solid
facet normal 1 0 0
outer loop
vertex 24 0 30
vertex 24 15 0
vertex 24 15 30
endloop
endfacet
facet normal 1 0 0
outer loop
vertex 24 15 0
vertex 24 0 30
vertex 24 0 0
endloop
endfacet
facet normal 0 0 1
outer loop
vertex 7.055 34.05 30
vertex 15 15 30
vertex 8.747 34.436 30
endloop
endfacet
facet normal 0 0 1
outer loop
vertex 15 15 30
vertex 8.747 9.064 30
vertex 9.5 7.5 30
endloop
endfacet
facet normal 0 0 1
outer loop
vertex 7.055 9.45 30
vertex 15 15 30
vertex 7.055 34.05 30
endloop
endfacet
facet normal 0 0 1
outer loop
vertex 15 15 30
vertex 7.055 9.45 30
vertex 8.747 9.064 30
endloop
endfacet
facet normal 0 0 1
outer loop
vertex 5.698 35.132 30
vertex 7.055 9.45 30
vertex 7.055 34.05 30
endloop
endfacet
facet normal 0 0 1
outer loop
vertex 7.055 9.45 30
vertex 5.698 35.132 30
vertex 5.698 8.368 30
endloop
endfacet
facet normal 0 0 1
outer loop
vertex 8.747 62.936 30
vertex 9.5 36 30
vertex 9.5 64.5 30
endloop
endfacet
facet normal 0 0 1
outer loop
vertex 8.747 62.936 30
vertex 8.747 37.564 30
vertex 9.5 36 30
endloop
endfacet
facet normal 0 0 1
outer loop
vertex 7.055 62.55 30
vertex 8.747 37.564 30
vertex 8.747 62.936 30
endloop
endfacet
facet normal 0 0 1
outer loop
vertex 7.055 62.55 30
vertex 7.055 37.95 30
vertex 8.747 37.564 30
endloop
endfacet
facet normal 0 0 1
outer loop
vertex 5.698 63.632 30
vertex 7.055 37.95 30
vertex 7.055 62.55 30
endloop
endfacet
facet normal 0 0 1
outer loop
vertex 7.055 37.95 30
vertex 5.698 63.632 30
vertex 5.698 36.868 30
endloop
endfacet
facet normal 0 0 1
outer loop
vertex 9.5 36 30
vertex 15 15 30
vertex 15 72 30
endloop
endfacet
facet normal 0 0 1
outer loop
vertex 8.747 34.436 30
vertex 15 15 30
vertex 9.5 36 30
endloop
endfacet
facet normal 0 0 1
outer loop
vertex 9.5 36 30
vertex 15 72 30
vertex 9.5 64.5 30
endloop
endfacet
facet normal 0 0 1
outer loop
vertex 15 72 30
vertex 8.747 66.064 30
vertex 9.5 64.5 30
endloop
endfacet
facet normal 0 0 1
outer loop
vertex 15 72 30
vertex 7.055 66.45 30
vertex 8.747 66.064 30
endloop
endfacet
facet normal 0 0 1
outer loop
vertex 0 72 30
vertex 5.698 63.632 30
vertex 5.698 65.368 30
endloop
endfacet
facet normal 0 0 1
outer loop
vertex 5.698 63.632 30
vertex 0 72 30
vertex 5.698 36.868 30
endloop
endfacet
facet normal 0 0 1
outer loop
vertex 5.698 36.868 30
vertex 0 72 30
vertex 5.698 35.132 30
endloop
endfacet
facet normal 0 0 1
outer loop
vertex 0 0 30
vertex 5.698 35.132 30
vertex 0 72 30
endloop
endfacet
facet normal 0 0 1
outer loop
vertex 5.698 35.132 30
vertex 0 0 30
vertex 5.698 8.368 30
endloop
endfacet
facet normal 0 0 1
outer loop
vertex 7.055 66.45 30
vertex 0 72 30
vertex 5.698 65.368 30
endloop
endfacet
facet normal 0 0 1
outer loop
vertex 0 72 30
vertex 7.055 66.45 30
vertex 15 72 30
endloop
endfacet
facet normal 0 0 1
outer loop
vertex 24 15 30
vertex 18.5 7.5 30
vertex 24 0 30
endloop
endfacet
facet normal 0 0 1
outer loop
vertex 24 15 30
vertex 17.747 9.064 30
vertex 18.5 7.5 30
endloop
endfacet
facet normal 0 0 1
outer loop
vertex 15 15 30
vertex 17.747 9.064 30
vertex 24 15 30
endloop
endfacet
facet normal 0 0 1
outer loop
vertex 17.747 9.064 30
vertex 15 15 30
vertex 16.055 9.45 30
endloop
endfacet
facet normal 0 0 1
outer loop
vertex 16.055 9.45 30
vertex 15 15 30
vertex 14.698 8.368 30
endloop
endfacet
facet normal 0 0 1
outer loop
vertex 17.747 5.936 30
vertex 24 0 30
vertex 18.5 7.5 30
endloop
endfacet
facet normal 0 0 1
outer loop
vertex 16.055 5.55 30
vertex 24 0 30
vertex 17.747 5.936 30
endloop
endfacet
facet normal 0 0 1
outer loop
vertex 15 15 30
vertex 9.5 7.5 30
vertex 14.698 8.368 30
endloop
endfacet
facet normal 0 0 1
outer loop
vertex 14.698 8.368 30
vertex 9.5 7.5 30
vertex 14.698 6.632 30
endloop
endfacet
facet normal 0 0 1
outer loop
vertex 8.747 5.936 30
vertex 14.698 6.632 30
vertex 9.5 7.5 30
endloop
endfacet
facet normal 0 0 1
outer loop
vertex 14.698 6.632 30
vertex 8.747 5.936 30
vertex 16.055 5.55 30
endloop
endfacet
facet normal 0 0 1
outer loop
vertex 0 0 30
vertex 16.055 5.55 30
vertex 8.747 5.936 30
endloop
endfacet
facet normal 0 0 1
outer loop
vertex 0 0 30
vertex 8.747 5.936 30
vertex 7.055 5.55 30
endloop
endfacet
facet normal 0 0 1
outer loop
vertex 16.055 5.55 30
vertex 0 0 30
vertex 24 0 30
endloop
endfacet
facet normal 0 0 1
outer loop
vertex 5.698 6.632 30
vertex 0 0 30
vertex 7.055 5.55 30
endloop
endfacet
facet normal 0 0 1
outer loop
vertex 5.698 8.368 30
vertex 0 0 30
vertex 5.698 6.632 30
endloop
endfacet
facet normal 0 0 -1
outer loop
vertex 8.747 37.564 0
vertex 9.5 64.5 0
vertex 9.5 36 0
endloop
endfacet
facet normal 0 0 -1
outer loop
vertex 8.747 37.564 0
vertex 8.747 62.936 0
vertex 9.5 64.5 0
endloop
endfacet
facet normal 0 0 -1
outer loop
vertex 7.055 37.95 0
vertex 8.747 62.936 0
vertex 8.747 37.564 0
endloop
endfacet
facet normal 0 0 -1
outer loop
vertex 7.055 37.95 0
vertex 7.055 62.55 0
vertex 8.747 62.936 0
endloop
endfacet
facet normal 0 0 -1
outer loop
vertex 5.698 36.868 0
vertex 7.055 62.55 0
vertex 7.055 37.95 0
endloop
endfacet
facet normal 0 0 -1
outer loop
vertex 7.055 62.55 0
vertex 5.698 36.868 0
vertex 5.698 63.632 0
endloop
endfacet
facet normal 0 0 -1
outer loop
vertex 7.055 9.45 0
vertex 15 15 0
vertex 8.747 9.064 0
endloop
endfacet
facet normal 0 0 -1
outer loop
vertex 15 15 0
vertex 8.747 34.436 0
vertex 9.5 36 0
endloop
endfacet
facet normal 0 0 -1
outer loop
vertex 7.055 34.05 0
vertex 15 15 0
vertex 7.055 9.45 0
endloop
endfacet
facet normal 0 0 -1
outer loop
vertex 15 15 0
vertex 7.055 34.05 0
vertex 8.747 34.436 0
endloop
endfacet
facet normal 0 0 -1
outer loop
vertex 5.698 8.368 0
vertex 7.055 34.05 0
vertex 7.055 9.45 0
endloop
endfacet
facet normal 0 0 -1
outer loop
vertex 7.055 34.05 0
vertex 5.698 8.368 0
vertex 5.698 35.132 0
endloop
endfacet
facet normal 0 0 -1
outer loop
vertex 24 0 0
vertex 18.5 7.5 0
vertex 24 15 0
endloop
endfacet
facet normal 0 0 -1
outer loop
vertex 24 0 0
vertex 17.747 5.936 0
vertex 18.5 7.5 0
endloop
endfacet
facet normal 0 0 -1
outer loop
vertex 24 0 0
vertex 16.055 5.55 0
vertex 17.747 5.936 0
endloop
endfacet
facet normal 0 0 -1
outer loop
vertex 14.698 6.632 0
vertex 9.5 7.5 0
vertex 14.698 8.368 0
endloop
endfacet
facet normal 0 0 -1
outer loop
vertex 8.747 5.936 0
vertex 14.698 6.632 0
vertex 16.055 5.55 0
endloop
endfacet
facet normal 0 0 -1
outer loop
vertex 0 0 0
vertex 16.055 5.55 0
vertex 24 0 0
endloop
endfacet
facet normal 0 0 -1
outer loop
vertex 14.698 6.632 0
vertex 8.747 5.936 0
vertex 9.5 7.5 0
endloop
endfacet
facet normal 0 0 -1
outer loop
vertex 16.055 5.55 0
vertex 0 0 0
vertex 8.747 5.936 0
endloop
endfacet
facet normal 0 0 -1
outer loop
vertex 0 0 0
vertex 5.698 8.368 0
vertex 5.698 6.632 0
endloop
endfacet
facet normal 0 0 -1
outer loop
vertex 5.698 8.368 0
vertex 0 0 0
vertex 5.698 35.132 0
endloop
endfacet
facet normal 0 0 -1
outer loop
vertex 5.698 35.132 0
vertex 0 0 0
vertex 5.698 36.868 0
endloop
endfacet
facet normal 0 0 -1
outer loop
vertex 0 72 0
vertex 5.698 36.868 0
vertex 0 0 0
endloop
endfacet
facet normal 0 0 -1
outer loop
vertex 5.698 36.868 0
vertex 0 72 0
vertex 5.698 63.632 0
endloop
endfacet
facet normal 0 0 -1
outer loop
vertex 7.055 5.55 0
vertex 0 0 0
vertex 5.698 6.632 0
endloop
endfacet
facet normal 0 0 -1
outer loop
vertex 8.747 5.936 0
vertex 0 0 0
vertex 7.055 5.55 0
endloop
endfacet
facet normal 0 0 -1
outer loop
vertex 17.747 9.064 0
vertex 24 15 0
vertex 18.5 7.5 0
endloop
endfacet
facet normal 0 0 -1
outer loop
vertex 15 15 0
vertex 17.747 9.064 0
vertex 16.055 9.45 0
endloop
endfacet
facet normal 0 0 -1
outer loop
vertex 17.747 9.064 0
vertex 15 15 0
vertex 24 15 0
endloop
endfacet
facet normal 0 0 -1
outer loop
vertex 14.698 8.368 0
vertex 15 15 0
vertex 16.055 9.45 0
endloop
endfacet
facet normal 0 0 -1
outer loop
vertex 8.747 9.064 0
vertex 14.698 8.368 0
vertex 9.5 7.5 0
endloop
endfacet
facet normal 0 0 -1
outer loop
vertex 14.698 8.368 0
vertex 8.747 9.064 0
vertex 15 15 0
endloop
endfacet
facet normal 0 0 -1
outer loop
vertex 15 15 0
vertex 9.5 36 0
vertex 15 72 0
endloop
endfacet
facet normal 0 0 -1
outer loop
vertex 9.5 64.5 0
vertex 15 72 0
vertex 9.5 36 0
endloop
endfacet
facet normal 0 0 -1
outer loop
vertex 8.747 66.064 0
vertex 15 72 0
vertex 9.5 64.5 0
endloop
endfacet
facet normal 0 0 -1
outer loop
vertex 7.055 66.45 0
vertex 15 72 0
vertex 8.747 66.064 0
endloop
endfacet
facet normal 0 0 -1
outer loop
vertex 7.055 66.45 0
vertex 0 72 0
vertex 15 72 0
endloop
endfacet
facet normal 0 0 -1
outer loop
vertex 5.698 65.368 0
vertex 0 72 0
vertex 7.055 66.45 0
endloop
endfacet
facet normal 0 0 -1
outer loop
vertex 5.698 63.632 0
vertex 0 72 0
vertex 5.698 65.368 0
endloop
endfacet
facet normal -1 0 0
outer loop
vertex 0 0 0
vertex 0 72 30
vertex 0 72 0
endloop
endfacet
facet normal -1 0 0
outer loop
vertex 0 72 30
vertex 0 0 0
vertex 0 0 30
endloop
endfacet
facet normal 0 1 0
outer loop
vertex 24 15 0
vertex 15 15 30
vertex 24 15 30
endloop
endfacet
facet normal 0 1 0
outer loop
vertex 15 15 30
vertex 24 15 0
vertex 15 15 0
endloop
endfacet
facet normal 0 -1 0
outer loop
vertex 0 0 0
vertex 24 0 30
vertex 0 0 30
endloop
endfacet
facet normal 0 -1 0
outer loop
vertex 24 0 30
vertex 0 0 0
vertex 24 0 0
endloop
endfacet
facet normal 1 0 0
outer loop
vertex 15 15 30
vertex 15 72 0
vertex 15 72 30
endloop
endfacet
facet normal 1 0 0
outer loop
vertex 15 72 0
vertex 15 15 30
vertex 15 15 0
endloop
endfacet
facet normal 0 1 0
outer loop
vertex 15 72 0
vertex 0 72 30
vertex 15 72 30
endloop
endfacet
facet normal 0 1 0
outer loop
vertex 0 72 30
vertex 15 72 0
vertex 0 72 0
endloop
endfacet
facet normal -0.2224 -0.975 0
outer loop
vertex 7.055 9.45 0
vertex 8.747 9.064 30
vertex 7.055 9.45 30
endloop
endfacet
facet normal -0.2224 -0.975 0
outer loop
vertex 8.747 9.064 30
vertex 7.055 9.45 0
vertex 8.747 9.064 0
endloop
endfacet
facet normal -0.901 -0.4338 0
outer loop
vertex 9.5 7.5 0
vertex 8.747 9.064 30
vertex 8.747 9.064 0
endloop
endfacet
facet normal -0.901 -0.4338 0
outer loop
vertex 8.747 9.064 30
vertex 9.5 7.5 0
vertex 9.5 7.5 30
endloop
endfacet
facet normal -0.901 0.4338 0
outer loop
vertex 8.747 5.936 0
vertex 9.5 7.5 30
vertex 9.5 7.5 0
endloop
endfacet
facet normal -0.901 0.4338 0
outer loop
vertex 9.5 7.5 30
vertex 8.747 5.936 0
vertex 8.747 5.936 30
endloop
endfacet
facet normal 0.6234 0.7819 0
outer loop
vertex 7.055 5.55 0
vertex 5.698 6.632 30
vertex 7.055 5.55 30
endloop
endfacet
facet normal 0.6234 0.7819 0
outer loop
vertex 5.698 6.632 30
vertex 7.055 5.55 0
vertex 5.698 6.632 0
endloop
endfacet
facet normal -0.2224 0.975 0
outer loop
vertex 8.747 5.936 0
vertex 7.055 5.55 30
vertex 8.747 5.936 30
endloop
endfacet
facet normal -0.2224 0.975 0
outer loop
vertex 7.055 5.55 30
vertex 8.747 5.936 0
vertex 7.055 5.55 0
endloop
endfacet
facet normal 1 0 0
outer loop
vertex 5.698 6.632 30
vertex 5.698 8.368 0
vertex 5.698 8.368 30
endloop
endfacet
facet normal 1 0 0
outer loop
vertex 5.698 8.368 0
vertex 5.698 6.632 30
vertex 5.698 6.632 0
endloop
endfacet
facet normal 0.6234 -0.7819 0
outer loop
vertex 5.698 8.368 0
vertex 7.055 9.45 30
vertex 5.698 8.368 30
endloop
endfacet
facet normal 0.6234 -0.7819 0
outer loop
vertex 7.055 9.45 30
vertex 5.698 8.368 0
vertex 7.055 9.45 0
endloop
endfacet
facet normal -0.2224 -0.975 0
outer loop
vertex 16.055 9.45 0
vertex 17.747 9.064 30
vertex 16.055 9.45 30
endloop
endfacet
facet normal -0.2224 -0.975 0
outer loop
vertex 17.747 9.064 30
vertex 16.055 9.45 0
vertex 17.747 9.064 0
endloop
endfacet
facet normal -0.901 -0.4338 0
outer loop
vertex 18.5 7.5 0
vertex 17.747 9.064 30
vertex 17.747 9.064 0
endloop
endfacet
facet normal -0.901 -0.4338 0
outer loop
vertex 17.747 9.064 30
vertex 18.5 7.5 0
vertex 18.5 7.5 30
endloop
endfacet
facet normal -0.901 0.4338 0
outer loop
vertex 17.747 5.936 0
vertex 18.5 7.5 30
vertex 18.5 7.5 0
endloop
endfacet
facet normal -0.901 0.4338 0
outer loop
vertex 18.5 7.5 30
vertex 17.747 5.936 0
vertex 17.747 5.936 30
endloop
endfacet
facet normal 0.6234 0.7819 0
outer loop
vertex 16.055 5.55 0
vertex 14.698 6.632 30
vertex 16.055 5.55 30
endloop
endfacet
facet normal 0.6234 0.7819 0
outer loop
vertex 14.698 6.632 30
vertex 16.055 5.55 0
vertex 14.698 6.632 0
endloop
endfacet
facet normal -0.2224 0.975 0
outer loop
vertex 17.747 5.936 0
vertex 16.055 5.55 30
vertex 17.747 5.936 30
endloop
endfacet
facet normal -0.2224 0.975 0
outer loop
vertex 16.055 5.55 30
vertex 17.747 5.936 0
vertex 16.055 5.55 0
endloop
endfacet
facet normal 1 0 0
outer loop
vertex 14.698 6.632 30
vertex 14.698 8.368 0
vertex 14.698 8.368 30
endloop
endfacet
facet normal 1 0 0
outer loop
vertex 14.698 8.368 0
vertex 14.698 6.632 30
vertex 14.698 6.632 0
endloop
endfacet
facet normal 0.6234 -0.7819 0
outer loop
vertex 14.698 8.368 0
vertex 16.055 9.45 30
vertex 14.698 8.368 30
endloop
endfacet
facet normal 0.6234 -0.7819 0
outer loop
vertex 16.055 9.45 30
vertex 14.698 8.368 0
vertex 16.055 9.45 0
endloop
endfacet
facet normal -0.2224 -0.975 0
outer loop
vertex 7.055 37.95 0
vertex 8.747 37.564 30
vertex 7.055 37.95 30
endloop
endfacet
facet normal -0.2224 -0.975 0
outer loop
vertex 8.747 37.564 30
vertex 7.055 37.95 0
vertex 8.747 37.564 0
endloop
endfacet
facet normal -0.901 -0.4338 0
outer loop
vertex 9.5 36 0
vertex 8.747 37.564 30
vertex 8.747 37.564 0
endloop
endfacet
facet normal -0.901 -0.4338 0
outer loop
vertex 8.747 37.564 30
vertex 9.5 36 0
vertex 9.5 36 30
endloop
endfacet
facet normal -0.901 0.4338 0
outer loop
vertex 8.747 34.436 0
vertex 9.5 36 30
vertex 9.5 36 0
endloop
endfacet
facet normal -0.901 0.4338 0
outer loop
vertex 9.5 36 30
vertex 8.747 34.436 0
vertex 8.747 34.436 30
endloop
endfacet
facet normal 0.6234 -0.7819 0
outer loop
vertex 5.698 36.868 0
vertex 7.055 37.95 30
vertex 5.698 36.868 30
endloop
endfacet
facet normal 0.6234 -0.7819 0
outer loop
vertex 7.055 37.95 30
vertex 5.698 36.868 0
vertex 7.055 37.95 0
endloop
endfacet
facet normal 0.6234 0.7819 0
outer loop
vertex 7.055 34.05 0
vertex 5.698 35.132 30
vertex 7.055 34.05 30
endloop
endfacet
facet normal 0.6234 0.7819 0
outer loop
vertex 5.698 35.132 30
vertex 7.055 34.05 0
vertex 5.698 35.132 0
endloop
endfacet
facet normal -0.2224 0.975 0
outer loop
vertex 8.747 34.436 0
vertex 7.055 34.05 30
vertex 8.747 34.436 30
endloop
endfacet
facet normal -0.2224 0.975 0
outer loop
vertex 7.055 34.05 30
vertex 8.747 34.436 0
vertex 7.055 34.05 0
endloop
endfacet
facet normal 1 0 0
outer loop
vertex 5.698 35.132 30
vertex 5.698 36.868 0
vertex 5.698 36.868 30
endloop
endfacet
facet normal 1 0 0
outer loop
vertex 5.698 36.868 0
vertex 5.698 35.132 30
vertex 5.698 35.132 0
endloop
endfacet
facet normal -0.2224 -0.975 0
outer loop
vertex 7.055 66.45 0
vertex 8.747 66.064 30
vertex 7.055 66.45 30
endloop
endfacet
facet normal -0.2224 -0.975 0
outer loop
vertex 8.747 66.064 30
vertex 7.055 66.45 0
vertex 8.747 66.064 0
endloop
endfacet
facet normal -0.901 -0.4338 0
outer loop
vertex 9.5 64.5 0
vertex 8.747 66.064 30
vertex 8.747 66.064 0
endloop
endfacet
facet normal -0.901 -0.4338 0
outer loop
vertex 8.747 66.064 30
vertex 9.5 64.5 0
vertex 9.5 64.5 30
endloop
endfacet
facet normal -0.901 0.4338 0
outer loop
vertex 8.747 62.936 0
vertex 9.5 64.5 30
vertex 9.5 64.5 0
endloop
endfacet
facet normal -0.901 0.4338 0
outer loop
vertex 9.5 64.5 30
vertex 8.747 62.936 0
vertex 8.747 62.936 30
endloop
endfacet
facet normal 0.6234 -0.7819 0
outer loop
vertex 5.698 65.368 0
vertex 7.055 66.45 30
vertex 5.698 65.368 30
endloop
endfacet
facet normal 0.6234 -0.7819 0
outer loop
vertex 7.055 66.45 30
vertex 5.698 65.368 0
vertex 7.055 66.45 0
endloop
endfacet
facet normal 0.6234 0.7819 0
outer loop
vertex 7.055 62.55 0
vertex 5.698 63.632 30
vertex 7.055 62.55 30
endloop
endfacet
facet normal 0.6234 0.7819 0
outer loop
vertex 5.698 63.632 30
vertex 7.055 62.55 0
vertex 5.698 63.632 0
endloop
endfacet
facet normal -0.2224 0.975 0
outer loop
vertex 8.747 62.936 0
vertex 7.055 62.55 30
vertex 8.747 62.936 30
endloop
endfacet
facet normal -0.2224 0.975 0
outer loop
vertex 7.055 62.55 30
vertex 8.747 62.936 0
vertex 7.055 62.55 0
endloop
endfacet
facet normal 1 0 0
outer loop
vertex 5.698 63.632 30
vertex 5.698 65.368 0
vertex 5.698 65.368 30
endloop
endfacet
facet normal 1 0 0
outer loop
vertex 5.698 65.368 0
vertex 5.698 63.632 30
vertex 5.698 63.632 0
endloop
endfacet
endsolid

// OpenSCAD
height = 30;
passageHeight = 10;
difference(){    
    union(){
        cube([24,15,height]);
        cube([15,72,height]);
        /*translate([0,106,0]){
            cube([15,12,height]);
        }
        translate([0,72,height/2 - passageHeight / 2]){
            cube([15,34,passageHeight]);
        }*/
    }
    translate([7.5,7.5,0]){
        cylinder(r=2,h=height);
    }
    translate([16.5,7.5,0]){
        cylinder(r=2,h=height);
    }
    translate([7.5,36,0]){
        cylinder(r=2,h=height);
    }
    translate([7.5,64.5,0]){
        cylinder(r=2,h=height);
    }
    /*translate([7.5,112,0]){
        cylinder(r=2,h=height);
    }*/
}
